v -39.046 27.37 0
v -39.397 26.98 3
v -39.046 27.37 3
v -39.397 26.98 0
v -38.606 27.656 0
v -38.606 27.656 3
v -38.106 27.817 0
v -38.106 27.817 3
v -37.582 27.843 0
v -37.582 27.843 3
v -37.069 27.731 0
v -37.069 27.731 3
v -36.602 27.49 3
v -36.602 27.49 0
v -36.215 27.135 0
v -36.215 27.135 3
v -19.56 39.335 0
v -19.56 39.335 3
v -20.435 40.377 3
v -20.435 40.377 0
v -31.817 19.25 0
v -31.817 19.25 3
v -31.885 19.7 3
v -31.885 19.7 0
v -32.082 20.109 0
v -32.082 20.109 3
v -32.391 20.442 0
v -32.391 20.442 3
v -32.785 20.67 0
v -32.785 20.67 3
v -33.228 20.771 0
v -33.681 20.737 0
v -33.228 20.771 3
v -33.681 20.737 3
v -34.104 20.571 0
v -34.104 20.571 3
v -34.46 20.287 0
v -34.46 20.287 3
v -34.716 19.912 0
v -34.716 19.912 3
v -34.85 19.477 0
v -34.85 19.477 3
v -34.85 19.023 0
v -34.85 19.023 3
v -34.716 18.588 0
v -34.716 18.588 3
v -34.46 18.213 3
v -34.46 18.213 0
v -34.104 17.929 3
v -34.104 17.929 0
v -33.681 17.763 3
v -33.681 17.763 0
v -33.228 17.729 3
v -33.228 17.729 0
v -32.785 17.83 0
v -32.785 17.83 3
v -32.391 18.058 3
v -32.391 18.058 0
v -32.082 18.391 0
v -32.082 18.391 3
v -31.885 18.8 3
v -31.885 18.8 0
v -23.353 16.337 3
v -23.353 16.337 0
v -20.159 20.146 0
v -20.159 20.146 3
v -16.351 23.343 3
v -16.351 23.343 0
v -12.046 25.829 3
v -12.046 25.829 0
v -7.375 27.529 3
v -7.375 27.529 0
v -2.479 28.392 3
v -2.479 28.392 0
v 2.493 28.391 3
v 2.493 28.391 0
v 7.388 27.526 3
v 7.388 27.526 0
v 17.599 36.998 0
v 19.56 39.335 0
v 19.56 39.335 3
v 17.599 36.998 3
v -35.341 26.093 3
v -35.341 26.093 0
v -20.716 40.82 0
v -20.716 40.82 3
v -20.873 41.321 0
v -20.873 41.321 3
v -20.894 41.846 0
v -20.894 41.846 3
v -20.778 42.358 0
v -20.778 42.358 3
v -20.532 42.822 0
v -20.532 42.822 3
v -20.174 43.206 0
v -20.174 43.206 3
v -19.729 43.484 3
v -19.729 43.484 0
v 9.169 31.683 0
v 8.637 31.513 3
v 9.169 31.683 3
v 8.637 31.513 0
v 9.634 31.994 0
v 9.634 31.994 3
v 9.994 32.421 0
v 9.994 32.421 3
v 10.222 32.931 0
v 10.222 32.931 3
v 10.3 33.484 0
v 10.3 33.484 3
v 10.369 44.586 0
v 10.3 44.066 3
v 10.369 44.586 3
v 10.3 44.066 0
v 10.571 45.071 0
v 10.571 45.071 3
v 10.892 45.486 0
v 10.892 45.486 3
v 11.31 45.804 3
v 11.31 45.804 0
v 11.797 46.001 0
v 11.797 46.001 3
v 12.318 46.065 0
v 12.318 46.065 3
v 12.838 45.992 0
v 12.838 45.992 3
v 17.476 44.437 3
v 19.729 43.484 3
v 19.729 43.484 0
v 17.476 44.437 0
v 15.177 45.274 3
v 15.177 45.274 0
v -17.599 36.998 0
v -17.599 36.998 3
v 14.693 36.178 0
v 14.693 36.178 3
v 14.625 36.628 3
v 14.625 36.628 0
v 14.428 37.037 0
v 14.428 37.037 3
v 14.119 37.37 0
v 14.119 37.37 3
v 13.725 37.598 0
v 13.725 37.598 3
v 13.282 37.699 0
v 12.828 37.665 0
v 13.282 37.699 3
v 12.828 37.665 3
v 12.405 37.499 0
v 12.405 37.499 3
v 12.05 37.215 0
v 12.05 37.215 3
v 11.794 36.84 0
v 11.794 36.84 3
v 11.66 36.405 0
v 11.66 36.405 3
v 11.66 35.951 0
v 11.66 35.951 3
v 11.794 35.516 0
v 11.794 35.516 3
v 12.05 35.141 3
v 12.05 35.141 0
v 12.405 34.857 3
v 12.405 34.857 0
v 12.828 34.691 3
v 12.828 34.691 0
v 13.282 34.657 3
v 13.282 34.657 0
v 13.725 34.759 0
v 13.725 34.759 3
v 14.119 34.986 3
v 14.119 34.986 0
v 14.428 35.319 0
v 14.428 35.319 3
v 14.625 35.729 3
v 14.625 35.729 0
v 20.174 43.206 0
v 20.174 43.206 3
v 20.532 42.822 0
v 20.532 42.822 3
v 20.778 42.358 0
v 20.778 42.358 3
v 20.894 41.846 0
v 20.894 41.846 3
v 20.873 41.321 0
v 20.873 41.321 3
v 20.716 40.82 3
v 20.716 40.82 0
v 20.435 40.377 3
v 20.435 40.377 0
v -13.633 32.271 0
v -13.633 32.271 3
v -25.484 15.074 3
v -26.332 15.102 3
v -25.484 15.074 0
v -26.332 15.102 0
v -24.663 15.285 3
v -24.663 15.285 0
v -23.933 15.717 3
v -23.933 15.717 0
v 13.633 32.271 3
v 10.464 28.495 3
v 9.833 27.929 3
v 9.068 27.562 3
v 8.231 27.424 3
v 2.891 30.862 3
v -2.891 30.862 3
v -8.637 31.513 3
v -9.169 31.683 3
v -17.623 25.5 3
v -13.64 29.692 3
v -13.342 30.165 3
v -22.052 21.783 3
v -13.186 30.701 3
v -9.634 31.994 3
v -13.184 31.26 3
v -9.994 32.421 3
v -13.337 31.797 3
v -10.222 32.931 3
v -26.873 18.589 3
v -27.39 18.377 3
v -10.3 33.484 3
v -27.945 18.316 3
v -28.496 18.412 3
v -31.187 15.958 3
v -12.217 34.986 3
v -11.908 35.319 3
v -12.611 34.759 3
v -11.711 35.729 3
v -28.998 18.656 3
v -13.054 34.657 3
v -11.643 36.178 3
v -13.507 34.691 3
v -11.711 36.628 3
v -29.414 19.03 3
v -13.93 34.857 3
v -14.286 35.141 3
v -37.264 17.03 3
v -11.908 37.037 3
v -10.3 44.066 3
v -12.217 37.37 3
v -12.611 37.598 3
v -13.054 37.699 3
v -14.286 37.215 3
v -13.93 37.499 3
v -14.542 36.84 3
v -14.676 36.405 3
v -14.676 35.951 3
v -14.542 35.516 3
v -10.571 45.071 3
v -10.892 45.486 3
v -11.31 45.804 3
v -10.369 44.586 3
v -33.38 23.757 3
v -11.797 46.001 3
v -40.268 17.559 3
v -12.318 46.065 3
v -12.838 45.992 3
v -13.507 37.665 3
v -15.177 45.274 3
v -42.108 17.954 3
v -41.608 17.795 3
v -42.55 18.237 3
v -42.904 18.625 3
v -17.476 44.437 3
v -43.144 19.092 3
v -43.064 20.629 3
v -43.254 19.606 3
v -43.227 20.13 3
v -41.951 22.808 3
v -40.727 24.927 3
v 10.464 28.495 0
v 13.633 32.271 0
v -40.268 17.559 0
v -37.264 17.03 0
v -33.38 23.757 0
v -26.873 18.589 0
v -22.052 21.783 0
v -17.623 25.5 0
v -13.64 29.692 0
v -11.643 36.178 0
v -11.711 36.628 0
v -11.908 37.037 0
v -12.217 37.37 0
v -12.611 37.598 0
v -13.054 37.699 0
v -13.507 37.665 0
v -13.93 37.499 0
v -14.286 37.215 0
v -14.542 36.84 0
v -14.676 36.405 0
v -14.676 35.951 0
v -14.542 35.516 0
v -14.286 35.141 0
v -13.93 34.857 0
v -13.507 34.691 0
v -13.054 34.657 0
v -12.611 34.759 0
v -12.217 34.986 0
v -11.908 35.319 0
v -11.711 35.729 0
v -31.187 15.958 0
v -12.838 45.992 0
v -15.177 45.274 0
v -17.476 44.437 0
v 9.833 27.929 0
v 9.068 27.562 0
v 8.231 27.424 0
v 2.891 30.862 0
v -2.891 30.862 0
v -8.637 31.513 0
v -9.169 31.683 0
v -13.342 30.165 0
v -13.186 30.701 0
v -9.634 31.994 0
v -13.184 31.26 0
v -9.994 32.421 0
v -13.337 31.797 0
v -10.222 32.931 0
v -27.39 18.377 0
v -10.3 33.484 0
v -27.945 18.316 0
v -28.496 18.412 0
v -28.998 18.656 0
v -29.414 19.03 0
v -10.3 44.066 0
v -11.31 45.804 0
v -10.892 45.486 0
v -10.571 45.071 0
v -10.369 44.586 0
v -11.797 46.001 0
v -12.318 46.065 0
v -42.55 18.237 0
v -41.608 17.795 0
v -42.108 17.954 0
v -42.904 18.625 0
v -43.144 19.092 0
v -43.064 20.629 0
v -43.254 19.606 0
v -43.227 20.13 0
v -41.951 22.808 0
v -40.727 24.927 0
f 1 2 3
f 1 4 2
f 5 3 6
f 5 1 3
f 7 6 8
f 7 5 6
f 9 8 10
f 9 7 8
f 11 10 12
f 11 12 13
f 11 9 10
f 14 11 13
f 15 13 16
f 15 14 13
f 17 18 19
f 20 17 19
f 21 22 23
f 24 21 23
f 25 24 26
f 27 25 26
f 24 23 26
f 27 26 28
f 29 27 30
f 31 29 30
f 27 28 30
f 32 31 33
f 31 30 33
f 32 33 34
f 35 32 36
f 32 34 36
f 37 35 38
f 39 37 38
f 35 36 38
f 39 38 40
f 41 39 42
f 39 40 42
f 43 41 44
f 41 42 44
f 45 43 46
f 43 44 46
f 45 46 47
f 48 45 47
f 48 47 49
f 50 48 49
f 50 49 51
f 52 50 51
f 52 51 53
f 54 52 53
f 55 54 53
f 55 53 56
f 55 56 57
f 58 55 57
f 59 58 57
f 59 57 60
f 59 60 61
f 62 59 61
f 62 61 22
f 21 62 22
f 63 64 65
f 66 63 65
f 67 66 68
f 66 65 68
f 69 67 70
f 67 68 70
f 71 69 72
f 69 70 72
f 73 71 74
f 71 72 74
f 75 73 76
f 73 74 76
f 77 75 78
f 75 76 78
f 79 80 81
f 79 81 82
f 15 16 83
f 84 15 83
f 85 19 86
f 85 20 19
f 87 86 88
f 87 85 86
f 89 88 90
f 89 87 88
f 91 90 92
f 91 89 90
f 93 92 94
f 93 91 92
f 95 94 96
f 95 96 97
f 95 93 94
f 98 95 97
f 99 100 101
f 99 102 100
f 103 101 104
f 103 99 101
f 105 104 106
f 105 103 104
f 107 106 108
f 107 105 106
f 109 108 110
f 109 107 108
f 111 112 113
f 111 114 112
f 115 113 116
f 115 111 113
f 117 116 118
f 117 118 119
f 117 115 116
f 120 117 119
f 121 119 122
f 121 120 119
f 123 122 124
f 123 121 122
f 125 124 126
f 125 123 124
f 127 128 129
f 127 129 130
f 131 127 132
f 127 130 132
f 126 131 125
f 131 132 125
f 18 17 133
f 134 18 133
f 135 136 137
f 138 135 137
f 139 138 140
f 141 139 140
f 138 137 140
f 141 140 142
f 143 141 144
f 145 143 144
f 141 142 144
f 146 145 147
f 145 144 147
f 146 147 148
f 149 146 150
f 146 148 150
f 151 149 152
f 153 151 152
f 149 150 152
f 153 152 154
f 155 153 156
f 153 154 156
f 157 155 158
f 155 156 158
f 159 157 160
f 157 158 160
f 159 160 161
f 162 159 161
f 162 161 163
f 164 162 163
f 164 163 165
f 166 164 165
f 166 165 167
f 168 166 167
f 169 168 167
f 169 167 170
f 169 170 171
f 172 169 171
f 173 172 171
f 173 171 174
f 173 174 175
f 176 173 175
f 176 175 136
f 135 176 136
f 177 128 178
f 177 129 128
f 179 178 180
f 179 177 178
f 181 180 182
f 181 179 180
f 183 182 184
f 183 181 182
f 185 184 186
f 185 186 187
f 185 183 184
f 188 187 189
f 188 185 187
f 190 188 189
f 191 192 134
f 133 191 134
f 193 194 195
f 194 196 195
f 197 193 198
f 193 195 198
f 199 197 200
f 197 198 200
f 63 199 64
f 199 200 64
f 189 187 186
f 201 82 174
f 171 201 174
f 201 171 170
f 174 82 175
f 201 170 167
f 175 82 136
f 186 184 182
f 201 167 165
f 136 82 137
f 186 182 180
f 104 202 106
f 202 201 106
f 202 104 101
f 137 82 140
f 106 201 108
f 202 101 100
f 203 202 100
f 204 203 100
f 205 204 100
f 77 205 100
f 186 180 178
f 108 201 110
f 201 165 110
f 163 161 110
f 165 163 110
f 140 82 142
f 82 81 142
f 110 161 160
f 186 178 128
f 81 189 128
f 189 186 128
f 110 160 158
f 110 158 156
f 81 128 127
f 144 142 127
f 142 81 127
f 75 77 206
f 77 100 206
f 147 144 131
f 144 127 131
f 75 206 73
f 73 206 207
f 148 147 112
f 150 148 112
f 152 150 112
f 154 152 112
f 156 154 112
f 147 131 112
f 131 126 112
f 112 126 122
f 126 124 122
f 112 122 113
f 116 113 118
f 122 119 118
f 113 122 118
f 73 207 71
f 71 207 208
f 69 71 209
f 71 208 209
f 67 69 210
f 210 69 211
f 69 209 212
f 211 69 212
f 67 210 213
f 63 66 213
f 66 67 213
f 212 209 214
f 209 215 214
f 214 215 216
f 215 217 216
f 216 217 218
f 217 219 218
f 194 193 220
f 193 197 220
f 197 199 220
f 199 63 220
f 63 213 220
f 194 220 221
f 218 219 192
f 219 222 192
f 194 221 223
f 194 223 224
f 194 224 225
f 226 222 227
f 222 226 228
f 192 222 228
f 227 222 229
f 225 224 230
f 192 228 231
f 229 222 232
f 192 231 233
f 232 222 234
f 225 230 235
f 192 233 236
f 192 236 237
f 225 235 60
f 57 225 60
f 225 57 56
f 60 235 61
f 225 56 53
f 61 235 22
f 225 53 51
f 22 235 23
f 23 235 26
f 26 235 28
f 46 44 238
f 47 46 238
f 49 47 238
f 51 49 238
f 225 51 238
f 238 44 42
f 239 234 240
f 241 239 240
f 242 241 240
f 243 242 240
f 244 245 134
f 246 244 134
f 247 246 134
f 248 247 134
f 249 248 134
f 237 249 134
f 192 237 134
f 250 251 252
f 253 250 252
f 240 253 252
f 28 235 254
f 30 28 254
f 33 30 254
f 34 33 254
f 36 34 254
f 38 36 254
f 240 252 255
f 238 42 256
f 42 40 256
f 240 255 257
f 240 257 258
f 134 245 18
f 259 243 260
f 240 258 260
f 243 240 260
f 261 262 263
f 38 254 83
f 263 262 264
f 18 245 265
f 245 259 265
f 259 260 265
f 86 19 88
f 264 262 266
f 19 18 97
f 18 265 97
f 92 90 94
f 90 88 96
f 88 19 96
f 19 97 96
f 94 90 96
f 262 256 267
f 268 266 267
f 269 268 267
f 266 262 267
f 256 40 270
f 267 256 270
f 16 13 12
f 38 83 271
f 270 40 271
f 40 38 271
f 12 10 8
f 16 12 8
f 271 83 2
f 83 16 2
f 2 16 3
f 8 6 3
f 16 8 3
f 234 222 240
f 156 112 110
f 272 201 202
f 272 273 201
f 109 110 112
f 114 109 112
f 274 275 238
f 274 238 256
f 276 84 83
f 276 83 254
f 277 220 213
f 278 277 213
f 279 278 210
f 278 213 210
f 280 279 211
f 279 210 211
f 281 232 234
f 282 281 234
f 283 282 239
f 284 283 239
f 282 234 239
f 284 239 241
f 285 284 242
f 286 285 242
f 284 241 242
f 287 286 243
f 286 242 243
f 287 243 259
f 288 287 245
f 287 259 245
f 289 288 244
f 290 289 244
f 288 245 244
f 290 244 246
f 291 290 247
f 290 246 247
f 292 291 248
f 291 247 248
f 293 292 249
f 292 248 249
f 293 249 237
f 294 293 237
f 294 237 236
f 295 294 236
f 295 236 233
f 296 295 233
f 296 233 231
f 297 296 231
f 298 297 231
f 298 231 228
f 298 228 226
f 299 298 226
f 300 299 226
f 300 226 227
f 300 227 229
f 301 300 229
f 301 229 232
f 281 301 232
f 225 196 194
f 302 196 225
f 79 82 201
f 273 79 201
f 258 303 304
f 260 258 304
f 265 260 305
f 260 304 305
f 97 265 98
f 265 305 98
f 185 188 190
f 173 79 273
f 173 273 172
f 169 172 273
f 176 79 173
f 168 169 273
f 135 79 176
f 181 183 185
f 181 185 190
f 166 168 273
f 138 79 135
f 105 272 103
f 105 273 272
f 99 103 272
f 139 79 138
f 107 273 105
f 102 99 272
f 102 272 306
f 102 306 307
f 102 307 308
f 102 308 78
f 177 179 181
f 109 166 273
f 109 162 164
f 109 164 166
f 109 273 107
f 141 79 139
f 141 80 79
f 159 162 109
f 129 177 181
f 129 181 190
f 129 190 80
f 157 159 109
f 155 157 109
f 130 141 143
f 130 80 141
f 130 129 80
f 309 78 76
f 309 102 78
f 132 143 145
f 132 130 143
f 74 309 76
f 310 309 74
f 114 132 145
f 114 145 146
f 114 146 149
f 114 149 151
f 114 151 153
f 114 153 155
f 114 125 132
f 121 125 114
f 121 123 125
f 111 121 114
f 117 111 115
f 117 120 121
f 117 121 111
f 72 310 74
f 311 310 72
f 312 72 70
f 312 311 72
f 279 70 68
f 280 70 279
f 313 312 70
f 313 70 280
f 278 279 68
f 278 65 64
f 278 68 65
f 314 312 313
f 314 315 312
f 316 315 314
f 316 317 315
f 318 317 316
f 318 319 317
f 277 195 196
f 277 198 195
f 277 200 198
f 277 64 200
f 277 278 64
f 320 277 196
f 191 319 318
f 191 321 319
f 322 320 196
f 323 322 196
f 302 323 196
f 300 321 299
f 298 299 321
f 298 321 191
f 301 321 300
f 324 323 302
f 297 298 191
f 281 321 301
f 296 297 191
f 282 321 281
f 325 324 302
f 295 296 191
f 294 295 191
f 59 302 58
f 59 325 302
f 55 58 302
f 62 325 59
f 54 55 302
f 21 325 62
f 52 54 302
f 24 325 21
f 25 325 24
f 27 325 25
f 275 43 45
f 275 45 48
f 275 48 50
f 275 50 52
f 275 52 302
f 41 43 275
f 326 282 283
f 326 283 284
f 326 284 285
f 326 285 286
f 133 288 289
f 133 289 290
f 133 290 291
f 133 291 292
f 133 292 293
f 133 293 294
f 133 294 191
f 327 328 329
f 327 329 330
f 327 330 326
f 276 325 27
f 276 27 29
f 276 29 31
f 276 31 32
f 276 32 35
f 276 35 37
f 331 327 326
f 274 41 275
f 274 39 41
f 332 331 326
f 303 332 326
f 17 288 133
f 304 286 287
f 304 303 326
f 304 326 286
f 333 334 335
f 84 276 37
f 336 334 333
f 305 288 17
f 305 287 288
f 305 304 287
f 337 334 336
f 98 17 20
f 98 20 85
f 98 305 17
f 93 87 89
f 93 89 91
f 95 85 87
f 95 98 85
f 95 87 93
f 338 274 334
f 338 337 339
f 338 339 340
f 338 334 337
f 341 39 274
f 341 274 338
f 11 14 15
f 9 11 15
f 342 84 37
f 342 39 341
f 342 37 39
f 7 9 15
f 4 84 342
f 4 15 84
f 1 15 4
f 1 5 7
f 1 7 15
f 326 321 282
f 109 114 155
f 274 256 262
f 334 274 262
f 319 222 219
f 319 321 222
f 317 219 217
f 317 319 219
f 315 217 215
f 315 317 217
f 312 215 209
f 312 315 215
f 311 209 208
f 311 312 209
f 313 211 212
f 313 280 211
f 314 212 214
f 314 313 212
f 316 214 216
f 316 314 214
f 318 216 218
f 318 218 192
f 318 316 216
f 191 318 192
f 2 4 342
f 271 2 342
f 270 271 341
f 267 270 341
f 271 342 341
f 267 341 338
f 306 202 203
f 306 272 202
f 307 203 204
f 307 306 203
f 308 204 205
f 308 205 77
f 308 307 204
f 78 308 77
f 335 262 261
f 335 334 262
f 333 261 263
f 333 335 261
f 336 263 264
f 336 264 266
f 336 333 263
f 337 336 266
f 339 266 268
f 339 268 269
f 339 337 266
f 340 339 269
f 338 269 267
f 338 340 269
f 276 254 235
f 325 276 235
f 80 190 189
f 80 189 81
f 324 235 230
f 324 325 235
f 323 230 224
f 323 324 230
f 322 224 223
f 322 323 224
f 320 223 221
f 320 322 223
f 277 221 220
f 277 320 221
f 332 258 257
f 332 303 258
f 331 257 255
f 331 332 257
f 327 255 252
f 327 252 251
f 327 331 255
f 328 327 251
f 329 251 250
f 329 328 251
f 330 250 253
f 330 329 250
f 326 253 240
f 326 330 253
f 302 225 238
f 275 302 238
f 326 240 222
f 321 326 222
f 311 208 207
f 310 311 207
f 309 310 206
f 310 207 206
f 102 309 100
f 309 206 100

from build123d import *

# Parameters (mm, degrees)
SKETCH_1_R          = 47.75
EXTRUDE_1_DEPTH     = 3
CUT_EXTRUDE_1_DEPTH = 68.595303091
FILLET_2_R          = 2
SKETCH_3_R          = 1.525
CUT_EXTRUDE_2_DEPTH = 68.441458022
SKETCH_6_R          = 28.5
CUT_EXTRUDE_4_DEPTH = 68.441458022
SKETCH_9_W          = 2.6
SKETCH_9_H          = 3.05
EXTRUDE_3_DEPTH     = 3
CUT_EXTRUDE_6_DEPTH = 68.441458022
FILLET_4_R          = 3


with BuildPart() as part:
    # ｽｹｯﾁ1 → ﾎﾞｽ - 押し出し1 (new body)
    with BuildSketch(Plane.XY):
        Circle(SKETCH_1_R)
    extrude(amount=EXTRUDE_1_DEPTH)

    # ｽｹｯﾁ2 → ｶｯﾄ - 押し出し1 (cut, through all)
    with BuildSketch(Plane.XY.offset(3)):
        with BuildLine():
            Line((-10.3, 46.625878008), (-10.3, 42.705))
            Line((-10.3, 42.705), (-12.9, 42.705))
            Line((-12.9, 42.705), (-12.9, 39.655))
            Line((-12.9, 39.655), (-10.3, 39.655))
            Line((-10.3, 39.655), (-10.3, 31.825692416))
            ThreePointArc((-10.3, 31.825692416), (0, 30.78), (10.3, 31.825692416))
            Line((10.3, 31.825692416), (10.3, 39.655))
            Line((10.3, 39.655), (12.9, 39.655))
            Line((12.9, 39.655), (12.9, 42.705))
            Line((12.9, 42.705), (10.3, 42.705))
            Line((10.3, 42.705), (10.3, 46.625878008))
            ThreePointArc((10.3, 46.625878008), (0, 47.75), (-10.3, 46.625878008))
        make_face()
        with BuildLine():
            Line((17.599484898, 36.998204772), (12.566902991, 31.000607203))
            ThreePointArc((12.566902991, 31.000607203), (19.785002626, 23.578847959), (28.347418519, 17.759182444))
            Line((28.347418519, 17.759182444), (33.380000426, 23.756780012))
            Line((33.380000426, 23.756780012), (35.371715978, 22.085532227))
            Line((35.371715978, 22.085532227), (37.332218188, 24.421967778))
            Line((37.332218188, 24.421967778), (35.340502636, 26.093215564))
            Line((35.340502636, 26.093215564), (37.860794438, 29.096782374))
            ThreePointArc((37.860794438, 29.096782374), (30.693108363, 36.578622159), (22.08027891, 42.338207133))
            Line((22.08027891, 42.338207133), (19.559987108, 39.334640323))
            Line((19.559987108, 39.334640323), (17.568271555, 41.005888108))
            Line((17.568271555, 41.005888108), (15.607769346, 38.669452557))
            Line((15.607769346, 38.669452557), (17.599484898, 36.998204772))
        make_face()
        with BuildLine():
            Line((37.263975216, 17.029538341), (29.553612406, 15.669993347))
            ThreePointArc((29.553612406, 15.669993347), (30.312382638, 5.344890909), (33.130764866, -4.617046365))
            Line((33.130764866, -4.617046365), (40.841127676, -3.257501371))
            Line((40.841127676, -3.257501371), (41.292612938, -5.818001528))
            Line((41.292612938, -5.818001528), (44.296276584, -5.288374587))
            Line((44.296276584, -5.288374587), (43.844791322, -2.727874429))
            Line((43.844791322, -2.727874429), (47.706102383, -2.047021108))
            ThreePointArc((47.706102383, -2.047021108), (47.024570206, 8.291700484), (44.128949923, 18.240018604))
            Line((44.128949923, 18.240018604), (40.267638862, 17.559165283))
            Line((40.267638862, 17.559165283), (39.8161536, 20.119665441))
            Line((39.8161536, 20.119665441), (36.812489954, 19.590038499))
            Line((36.812489954, 19.590038499), (37.263975216, 17.029538341))
        make_face()
        with BuildLine():
            Line((39.492237387, -10.907438341), (32.711858125, -6.992784549))
            ThreePointArc((32.711858125, -6.992784549), (26.656261928, -15.39), (22.411858125, -24.832907867))
            Line((22.411858125, -24.832907867), (29.192237387, -28.747561659))
            Line((29.192237387, -28.747561659), (27.892237387, -30.999227709))
            Line((27.892237387, -30.999227709), (30.533614869, -32.524227709))
            Line((30.533614869, -32.524227709), (31.833614869, -30.272561659))
            Line((31.833614869, -30.272561659), (35.229194829, -32.233000663))
            ThreePointArc((35.229194829, -32.233000663), (41.352713031, -23.875), (45.529194829, -14.392877345))
            Line((45.529194829, -14.392877345), (42.133614869, -12.432438341))
            Line((42.133614869, -12.432438341), (43.433614869, -10.180772291))
            Line((43.433614869, -10.180772291), (40.792237387, -8.655772291))
            Line((40.792237387, -8.655772291), (39.492237387, -10.907438341))
        make_face()
        with BuildLine():
            Line((23.241642778, -33.740703401), (20.563861876, -26.383560838))
            ThreePointArc((20.563861876, -26.383560838), (10.527380012, -28.923738868), (1.206193887, -33.429175791))
            Line((1.206193887, -33.429175791), (3.883974789, -40.786318354))
            Line((3.883974789, -40.786318354), (1.440773975, -41.675570726))
            Line((1.440773975, -41.675570726), (2.483935413, -44.54163322))
            Line((2.483935413, -44.54163322), (4.927136227, -43.652380847))
            Line((4.927136227, -43.652380847), (6.268155485, -47.336800978))
            ThreePointArc((6.268155485, -47.336800978), (16.331461844, -44.870322643), (25.625823473, -40.291186025))
            Line((25.625823473, -40.291186025), (24.284804215, -36.606765894))
            Line((24.284804215, -36.606765894), (26.728005029, -35.717513522))
            Line((26.728005029, -35.717513522), (25.684843592, -32.851451028))
            Line((25.684843592, -32.851451028), (23.241642778, -33.740703401))
        make_face()
        with BuildLine():
            Line((-3.883974789, -40.786318354), (-1.206193887, -33.429175791))
            ThreePointArc((-1.206193887, -33.429175791), (-10.527380012, -28.923738868), (-20.563861876, -26.383560838))
            Line((-20.563861876, -26.383560838), (-23.241642778, -33.740703401))
            Line((-23.241642778, -33.740703401), (-25.684843592, -32.851451028))
            Line((-25.684843592, -32.851451028), (-26.728005029, -35.717513522))
            Line((-26.728005029, -35.717513522), (-24.284804215, -36.606765894))
            Line((-24.284804215, -36.606765894), (-25.625823473, -40.291186025))
            ThreePointArc((-25.625823473, -40.291186025), (-16.331461844, -44.870322643), (-6.268155485, -47.336800978))
            Line((-6.268155485, -47.336800978), (-4.927136227, -43.652380847))
            Line((-4.927136227, -43.652380847), (-2.483935413, -44.54163322))
            Line((-2.483935413, -44.54163322), (-1.440773975, -41.675570726))
            Line((-1.440773975, -41.675570726), (-3.883974789, -40.786318354))
        make_face()
        with BuildLine():
            Line((-29.192237387, -28.747561659), (-22.411858125, -24.832907867))
            ThreePointArc((-22.411858125, -24.832907867), (-26.656261928, -15.39), (-32.711858125, -6.992784549))
            Line((-32.711858125, -6.992784549), (-39.492237387, -10.907438341))
            Line((-39.492237387, -10.907438341), (-40.792237387, -8.655772291))
            Line((-40.792237387, -8.655772291), (-43.433614869, -10.180772291))
            Line((-43.433614869, -10.180772291), (-42.133614869, -12.432438341))
            Line((-42.133614869, -12.432438341), (-45.529194829, -14.392877345))
            ThreePointArc((-45.529194829, -14.392877345), (-41.352713031, -23.875), (-35.229194829, -32.233000663))
            Line((-35.229194829, -32.233000663), (-31.833614869, -30.272561659))
            Line((-31.833614869, -30.272561659), (-30.533614869, -32.524227709))
            Line((-30.533614869, -32.524227709), (-27.892237387, -30.999227709))
            Line((-27.892237387, -30.999227709), (-29.192237387, -28.747561659))
        make_face()
        with BuildLine():
            Line((-40.841127676, -3.257501371), (-33.130764866, -4.617046365))
            ThreePointArc((-33.130764866, -4.617046365), (-30.312382638, 5.344890909), (-29.553612406, 15.669993347))
            Line((-29.553612406, 15.669993347), (-37.263975216, 17.029538341))
            Line((-37.263975216, 17.029538341), (-36.812489954, 19.590038499))
            Line((-36.812489954, 19.590038499), (-39.8161536, 20.119665441))
            Line((-39.8161536, 20.119665441), (-40.267638862, 17.559165283))
            Line((-40.267638862, 17.559165283), (-44.128949923, 18.240018604))
            ThreePointArc((-44.128949923, 18.240018604), (-47.024570206, 8.291700484), (-47.706102383, -2.047021108))
            Line((-47.706102383, -2.047021108), (-43.844791322, -2.727874429))
            Line((-43.844791322, -2.727874429), (-44.296276584, -5.288374587))
            Line((-44.296276584, -5.288374587), (-41.292612938, -5.818001528))
            Line((-41.292612938, -5.818001528), (-40.841127676, -3.257501371))
        make_face()
        with BuildLine():
            Line((-33.380000426, 23.756780012), (-28.347418519, 17.759182444))
            ThreePointArc((-28.347418519, 17.759182444), (-19.785002626, 23.578847959), (-12.566902991, 31.000607203))
            Line((-12.566902991, 31.000607203), (-17.599484898, 36.998204772))
            Line((-17.599484898, 36.998204772), (-15.607769346, 38.669452557))
            Line((-15.607769346, 38.669452557), (-17.568271555, 41.005888108))
            Line((-17.568271555, 41.005888108), (-19.559987108, 39.334640323))
            Line((-19.559987108, 39.334640323), (-22.08027891, 42.338207133))
            ThreePointArc((-22.08027891, 42.338207133), (-30.693108363, 36.578622159), (-37.860794438, 29.096782374))
            Line((-37.860794438, 29.096782374), (-35.340502636, 26.093215564))
            Line((-35.340502636, 26.093215564), (-37.332218188, 24.421967778))
            Line((-37.332218188, 24.421967778), (-35.371715978, 22.085532227))
            Line((-35.371715978, 22.085532227), (-33.380000426, 23.756780012))
        make_face()
    extrude(amount=-CUT_EXTRUDE_1_DEPTH, mode=Mode.SUBTRACT)

    # ﾌｨﾚｯﾄ2
    fillet_2_edges = [part.edges().sort_by_distance(p)[0] for p in [
        (-47.706102383, -2.047021108, 1.5),
        (-44.128949923, 18.240018604, 1.5),
        (-29.553612406, 15.669993347, 1.5),
        (-33.130764866, -4.617046365, 1.5),
        (-37.860794438, 29.096782374, 1.5),
        (-22.08027891, 42.338207133, 1.5),
        (-12.566902991, 31.000607203, 1.5),
        (-28.347418519, 17.759182444, 1.5),
        (-6.268155485, -47.336800978, 1.5),
        (-25.625823473, -40.291186025, 1.5),
        (-20.563861876, -26.383560838, 1.5),
        (-1.206193887, -33.429175791, 1.5),
        (-35.229194829, -32.233000663, 1.5),
        (-45.529194829, -14.392877345, 1.5),
        (-32.711858125, -6.992784549, 1.5),
        (-22.411858125, -24.832907867, 1.5),
        (45.529194829, -14.392877345, 1.5),
        (35.229194829, -32.233000663, 1.5),
        (22.411858125, -24.832907867, 1.5),
        (32.711858125, -6.992784549, 1.5),
        (25.625823473, -40.291186025, 1.5),
        (6.268155485, -47.336800978, 1.5),
        (1.206193887, -33.429175791, 1.5),
        (20.563861876, -26.383560838, 1.5),
        (22.08027891, 42.338207133, 1.5),
        (37.860794438, 29.096782374, 1.5),
        (28.347418519, 17.759182444, 1.5),
        (12.566902991, 31.000607203, 1.5),
        (44.128949923, 18.240018604, 1.5),
        (47.706102383, -2.047021108, 1.5),
        (33.130764866, -4.617046365, 1.5),
        (29.553612406, 15.669993347, 1.5),
        (-10.3, 46.625878008, 1.5),
        (10.3, 46.625878008, 1.5),
        (10.3, 31.825692416, 1.5),
        (-10.3, 31.825692416, 1.5),
    ]]
    fillet(fillet_2_edges, radius=FILLET_2_R)

    # ｽｹｯﾁ3 → ｶｯﾄ - 押し出し2 (cut, through all)
    with BuildSketch(Plane.XY.offset(3)):
        with Locations((0, -38.5)):
            Circle(SKETCH_3_R)
        with Locations((-24.747322973, -29.49271106)):
            Circle(SKETCH_3_R)
        with Locations((-37.915098491, -6.68545484)):
            Circle(SKETCH_3_R)
        with Locations((-33.341978046, 19.25)):
            Circle(SKETCH_3_R)
        with Locations((-13.167775518, 36.1781659)):
            Circle(SKETCH_3_R)
        with Locations((13.167775518, 36.1781659)):
            Circle(SKETCH_3_R)
        with Locations((33.341978046, 19.25)):
            Circle(SKETCH_3_R)
        with Locations((37.915098491, -6.68545484)):
            Circle(SKETCH_3_R)
        with Locations((24.747322973, -29.49271106)):
            Circle(SKETCH_3_R)
    extrude(amount=-CUT_EXTRUDE_2_DEPTH, mode=Mode.SUBTRACT)

    # ｽｹｯﾁ6 → ｶｯﾄ - 押し出し4 (cut, through all)
    with BuildSketch(Plane(origin=(0, 0, 0), x_dir=(-1, 0, 0), z_dir=(0, 0, -1))):
        Circle(SKETCH_6_R)
    extrude(amount=-CUT_EXTRUDE_4_DEPTH, mode=Mode.SUBTRACT)

    # ｽｹｯﾁ9 → ﾎﾞｽ - 押し出し3 (add)
    with BuildSketch(Plane(origin=(0, 0, 0), x_dir=(-1, 0, 0), z_dir=(0, 0, -1))):
        Polygon((-19.559987108, 39.334640323), (-17.599484898, 36.998204772), (-15.607769346, 38.669452557), (-17.568271555, 41.005888108), align=None)
        with Locations((-11.6, 41.18)):
            Rectangle(SKETCH_9_W, SKETCH_9_H)
        with Locations((11.6, 41.18)):
            Rectangle(SKETCH_9_W, SKETCH_9_H)
        Polygon((17.599484898, 36.998204772), (15.607769346, 38.669452557), (17.568271555, 41.005888108), (19.559987108, 39.334640323), align=None)
        Polygon((33.380000426, 23.756780012), (35.371715978, 22.085532227), (37.332218188, 24.421967778), (35.340502636, 26.093215564), align=None)
        Polygon((36.812489954, 19.590038499), (37.263975216, 17.029538341), (40.267638862, 17.559165283), (39.8161536, 20.119665441), align=None)
    extrude(amount=-EXTRUDE_3_DEPTH)

    # ｽｹｯﾁ10 → ｶｯﾄ - 押し出し6 (cut, through all)
    with BuildSketch(Plane(origin=(0, 0, 0), x_dir=(-1, 0, 0), z_dir=(0, 0, -1))):
        with BuildLine():
            Line((-22.902623398, 43.318239132), (4.067787689, 11.176154824))
            Line((4.067787689, 11.176154824), (45.388854775, 18.462173823))
            ThreePointArc((45.388854775, 18.462173823), (-16.758987023, -46.044938419), (-22.902623398, 43.318239132))
        make_face()
    extrude(amount=-CUT_EXTRUDE_6_DEPTH, mode=Mode.SUBTRACT)

    # ﾌｨﾚｯﾄ4
    fillet_4_edges = [part.edges().sort_by_distance(p)[0] for p in [
        (-24.381381174, 14.75798943, 1.5),
        (9.190968814, 26.977325521, 1.5),
    ]]
    fillet(fillet_4_edges, radius=FILLET_4_R)


solid = part.part
